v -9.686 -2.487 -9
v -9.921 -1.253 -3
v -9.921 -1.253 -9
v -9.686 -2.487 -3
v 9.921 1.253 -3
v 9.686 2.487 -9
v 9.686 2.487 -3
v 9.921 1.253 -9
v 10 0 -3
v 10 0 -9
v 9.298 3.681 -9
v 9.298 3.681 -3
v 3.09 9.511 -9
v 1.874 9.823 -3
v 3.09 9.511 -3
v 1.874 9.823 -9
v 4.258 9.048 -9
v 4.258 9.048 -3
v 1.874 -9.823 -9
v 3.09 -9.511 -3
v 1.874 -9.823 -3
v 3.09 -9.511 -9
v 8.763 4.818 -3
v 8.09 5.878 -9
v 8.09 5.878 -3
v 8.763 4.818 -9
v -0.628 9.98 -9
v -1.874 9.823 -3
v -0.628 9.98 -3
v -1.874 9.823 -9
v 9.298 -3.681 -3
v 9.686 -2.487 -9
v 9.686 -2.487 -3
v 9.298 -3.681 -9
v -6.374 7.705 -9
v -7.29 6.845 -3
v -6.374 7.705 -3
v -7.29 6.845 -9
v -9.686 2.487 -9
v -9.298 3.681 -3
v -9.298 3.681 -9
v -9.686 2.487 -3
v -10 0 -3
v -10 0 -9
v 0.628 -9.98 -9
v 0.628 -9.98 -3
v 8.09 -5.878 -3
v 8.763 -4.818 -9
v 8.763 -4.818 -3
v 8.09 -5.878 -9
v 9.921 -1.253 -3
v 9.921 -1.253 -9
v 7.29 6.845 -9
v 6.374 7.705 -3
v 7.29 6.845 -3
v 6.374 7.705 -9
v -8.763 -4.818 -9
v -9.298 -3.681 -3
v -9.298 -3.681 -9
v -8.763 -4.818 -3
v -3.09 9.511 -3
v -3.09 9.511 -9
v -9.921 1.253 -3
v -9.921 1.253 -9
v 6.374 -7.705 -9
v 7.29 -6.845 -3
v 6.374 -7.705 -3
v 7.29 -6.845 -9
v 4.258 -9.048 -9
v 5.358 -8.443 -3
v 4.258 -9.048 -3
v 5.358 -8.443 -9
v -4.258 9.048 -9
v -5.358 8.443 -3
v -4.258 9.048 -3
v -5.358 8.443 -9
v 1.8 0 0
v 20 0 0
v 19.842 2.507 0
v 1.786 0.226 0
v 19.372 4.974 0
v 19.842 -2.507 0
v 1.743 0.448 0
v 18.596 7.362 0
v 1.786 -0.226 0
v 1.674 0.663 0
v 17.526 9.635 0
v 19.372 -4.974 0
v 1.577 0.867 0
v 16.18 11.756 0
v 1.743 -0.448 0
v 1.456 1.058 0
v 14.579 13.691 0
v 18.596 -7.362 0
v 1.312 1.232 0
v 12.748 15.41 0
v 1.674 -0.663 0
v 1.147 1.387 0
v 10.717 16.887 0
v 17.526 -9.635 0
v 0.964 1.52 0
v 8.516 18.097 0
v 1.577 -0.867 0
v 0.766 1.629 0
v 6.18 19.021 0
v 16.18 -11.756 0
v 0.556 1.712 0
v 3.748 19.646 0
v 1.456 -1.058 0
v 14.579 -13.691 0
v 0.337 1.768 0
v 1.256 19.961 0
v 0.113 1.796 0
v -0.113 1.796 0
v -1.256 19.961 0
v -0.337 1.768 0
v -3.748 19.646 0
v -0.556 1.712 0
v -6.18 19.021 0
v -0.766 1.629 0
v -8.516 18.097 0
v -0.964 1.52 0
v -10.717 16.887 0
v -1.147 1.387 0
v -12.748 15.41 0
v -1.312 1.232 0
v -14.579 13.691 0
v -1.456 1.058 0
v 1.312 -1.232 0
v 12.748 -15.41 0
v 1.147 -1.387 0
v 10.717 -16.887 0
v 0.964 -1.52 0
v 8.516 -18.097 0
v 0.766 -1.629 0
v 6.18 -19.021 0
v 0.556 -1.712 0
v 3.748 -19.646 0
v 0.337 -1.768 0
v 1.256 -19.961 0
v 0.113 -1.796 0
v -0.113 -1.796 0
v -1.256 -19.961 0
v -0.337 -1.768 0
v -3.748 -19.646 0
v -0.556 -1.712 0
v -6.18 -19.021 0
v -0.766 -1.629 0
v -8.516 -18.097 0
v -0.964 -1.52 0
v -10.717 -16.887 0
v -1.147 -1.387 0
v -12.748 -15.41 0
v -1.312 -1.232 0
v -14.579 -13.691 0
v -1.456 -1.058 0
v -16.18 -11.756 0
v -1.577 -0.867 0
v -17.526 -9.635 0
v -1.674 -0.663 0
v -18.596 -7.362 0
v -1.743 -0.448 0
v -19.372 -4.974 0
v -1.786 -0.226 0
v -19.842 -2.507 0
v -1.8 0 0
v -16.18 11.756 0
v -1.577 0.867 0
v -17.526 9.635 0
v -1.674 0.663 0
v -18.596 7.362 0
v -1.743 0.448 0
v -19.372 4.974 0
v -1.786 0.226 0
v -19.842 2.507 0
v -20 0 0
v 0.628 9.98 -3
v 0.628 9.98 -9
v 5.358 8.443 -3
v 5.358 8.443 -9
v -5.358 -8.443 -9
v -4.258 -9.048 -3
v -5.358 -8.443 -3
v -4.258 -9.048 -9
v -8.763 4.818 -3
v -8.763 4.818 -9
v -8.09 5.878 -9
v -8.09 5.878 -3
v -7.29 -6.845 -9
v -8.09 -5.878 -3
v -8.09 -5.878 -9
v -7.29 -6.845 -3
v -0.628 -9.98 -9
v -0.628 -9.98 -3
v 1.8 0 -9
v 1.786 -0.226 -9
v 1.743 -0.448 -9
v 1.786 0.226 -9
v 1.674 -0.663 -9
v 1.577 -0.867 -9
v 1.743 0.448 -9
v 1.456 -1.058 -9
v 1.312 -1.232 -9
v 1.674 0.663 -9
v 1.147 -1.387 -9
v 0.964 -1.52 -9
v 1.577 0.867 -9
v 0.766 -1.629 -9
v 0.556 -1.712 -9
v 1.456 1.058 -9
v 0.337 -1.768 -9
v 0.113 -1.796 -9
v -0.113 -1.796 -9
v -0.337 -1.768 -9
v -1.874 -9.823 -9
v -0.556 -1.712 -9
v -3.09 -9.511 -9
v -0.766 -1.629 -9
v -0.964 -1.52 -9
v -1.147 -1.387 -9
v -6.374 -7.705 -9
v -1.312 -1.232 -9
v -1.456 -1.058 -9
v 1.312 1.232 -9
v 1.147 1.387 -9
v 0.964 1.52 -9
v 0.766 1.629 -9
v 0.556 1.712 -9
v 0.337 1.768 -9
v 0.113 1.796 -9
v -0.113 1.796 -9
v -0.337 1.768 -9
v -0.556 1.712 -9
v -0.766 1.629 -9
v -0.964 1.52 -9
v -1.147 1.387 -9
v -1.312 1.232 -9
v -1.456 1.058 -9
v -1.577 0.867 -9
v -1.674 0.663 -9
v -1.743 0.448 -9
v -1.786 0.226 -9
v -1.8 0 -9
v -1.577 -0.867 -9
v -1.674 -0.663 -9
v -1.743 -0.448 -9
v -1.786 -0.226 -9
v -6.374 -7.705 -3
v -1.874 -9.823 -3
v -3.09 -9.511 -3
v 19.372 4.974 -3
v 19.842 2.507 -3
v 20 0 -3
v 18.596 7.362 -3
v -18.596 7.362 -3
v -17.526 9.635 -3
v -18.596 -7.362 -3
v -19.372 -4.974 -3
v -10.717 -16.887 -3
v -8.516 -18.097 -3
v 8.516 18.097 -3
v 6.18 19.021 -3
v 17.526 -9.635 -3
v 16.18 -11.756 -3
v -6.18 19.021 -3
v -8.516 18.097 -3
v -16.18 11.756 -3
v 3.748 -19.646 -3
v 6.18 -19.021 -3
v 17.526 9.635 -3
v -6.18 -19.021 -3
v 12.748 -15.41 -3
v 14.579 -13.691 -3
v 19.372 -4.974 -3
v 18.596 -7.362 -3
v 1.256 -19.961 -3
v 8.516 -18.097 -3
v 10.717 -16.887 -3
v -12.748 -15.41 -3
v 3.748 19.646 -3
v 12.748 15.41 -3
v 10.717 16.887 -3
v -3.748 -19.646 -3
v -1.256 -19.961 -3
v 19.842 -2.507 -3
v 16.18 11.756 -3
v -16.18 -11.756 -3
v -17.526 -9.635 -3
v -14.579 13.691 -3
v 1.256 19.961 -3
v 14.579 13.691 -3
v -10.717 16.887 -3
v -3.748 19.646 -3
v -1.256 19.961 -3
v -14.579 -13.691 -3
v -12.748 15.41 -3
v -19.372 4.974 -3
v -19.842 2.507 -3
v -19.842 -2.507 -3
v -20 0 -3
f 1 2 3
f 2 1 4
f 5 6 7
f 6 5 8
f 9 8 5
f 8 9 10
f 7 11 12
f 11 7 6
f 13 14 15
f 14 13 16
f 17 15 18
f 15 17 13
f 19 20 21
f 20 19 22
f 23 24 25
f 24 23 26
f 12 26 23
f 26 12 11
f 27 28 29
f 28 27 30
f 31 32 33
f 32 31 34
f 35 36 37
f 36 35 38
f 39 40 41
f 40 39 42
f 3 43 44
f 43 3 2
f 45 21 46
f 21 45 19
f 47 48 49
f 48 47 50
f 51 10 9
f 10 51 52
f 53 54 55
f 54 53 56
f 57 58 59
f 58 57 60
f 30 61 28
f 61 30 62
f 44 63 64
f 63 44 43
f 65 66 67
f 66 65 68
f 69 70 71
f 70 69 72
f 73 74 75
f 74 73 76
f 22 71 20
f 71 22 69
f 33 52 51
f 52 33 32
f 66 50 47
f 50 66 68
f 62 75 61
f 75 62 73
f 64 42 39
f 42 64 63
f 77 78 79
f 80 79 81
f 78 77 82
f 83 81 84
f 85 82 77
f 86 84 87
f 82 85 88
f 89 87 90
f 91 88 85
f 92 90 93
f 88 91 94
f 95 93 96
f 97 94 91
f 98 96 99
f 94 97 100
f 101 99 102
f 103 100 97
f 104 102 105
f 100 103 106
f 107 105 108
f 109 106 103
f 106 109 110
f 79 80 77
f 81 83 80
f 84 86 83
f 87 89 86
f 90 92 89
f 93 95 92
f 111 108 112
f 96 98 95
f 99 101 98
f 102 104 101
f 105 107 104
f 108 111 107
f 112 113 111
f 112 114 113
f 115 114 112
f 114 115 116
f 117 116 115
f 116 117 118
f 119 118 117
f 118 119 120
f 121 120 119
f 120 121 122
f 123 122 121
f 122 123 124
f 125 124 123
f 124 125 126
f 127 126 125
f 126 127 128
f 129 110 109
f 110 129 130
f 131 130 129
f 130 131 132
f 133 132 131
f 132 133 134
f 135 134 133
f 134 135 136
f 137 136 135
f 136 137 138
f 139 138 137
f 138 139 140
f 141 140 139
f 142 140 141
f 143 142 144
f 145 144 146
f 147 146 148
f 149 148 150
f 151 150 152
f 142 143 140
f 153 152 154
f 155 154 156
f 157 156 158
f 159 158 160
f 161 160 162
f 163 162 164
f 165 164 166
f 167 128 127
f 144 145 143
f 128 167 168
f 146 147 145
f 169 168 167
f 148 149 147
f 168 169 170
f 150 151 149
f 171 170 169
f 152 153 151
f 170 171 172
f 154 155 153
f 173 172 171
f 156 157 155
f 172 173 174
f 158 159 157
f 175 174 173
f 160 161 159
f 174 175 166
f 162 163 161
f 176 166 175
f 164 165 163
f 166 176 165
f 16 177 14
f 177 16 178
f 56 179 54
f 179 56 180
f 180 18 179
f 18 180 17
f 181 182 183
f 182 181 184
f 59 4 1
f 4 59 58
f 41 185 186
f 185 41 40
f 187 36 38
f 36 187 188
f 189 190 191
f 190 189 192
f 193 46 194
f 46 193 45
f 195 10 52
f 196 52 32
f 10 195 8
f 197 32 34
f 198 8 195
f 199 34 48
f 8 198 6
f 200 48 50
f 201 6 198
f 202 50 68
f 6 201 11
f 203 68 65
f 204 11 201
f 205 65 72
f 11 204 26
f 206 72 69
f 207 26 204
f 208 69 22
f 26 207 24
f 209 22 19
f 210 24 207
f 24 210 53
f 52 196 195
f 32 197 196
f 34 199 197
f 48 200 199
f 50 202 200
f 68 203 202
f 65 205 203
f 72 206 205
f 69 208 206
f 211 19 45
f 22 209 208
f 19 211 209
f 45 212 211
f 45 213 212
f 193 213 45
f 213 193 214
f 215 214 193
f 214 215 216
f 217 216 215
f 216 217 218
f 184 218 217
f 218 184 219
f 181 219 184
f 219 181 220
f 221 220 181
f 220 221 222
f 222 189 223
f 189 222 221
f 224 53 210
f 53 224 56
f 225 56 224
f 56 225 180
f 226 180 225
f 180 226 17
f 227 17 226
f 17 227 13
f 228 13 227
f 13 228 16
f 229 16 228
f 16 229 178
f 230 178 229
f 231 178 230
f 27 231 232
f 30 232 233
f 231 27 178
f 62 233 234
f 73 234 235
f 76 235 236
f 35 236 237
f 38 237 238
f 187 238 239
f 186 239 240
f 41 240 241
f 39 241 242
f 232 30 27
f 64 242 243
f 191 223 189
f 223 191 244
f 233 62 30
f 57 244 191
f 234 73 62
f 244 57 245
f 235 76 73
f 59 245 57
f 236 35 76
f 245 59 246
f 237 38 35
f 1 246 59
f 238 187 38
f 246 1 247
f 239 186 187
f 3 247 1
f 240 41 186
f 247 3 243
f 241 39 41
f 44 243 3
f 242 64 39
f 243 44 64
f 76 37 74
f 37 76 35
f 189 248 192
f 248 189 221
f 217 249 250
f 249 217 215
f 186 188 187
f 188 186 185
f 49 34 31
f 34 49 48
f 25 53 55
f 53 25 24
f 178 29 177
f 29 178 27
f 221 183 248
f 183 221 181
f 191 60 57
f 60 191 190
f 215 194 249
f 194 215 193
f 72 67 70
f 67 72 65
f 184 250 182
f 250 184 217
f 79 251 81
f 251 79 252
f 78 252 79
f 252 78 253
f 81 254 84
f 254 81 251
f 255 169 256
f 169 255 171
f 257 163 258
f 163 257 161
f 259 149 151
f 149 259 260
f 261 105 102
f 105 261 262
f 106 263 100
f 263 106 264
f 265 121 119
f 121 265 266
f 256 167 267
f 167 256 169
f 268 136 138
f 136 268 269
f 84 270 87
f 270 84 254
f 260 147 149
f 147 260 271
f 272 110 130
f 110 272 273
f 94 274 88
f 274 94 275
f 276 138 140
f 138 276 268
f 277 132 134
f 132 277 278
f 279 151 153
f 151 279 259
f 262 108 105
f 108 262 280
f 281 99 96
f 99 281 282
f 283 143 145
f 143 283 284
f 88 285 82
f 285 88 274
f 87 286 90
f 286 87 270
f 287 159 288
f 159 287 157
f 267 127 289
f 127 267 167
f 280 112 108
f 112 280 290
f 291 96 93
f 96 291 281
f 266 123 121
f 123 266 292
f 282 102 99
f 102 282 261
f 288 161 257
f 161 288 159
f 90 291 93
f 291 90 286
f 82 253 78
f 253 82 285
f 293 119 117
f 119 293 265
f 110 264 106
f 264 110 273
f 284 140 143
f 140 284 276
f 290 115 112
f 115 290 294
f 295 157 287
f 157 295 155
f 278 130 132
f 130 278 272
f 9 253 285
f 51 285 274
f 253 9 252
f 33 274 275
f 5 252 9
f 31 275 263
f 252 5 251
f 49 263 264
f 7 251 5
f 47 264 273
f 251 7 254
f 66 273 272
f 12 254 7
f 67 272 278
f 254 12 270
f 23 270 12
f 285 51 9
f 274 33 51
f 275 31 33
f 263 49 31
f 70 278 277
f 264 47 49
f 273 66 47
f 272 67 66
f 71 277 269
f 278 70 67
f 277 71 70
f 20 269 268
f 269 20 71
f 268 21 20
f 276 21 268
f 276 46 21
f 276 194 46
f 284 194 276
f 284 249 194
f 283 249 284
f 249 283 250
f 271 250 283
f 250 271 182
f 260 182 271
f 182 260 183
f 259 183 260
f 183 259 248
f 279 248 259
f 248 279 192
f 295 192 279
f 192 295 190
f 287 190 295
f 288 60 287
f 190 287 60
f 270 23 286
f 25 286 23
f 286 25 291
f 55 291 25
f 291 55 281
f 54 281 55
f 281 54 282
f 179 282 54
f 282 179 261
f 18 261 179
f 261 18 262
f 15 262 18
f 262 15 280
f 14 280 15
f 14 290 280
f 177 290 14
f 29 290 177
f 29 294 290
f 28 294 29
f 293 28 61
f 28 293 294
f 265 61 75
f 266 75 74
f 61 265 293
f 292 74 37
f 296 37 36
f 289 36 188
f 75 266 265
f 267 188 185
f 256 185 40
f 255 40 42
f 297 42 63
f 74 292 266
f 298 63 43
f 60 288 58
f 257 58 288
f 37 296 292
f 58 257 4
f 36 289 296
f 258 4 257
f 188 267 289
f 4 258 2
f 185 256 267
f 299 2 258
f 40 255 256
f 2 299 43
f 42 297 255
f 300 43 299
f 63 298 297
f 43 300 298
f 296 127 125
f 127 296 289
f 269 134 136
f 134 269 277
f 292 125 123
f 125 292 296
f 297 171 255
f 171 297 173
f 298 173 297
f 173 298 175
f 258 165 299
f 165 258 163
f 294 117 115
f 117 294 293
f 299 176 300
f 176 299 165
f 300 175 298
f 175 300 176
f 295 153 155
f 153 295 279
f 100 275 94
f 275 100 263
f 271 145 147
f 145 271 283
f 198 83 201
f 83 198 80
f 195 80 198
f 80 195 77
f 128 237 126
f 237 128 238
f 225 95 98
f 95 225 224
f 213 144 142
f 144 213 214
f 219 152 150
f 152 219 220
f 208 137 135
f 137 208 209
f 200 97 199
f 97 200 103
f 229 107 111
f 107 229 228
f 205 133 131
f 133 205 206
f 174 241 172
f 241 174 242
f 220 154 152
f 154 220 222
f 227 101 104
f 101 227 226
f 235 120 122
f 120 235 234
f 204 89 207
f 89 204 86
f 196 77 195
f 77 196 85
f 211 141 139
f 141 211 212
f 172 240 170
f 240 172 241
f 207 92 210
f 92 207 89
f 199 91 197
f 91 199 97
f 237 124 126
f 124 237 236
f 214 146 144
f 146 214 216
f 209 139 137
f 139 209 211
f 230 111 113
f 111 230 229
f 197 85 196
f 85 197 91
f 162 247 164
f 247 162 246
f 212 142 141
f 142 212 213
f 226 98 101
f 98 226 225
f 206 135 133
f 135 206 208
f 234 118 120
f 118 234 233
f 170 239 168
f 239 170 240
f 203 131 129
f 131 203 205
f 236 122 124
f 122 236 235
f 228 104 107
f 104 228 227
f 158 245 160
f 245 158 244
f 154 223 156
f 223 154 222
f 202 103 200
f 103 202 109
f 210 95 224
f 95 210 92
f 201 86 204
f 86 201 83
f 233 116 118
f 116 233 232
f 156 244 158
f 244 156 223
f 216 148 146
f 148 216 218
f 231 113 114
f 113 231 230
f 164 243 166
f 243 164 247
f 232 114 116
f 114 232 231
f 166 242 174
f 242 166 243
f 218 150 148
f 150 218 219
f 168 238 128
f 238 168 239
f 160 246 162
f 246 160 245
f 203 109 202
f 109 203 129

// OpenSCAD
$fn = 50;


difference() {
	union() {
		translate(v = [0, 0, -9.0000000000]) {
			cylinder(h = 9, r = 10.0000000000);
		}
		translate(v = [0, 0, -3.0000000000]) {
			cylinder(h = 3, r = 20.0000000000);
		}
	}
	union() {
		#translate(v = [0, 0, -9]) {
			cylinder(h = 9, r = 1.8000000000);
		}
	}
}
